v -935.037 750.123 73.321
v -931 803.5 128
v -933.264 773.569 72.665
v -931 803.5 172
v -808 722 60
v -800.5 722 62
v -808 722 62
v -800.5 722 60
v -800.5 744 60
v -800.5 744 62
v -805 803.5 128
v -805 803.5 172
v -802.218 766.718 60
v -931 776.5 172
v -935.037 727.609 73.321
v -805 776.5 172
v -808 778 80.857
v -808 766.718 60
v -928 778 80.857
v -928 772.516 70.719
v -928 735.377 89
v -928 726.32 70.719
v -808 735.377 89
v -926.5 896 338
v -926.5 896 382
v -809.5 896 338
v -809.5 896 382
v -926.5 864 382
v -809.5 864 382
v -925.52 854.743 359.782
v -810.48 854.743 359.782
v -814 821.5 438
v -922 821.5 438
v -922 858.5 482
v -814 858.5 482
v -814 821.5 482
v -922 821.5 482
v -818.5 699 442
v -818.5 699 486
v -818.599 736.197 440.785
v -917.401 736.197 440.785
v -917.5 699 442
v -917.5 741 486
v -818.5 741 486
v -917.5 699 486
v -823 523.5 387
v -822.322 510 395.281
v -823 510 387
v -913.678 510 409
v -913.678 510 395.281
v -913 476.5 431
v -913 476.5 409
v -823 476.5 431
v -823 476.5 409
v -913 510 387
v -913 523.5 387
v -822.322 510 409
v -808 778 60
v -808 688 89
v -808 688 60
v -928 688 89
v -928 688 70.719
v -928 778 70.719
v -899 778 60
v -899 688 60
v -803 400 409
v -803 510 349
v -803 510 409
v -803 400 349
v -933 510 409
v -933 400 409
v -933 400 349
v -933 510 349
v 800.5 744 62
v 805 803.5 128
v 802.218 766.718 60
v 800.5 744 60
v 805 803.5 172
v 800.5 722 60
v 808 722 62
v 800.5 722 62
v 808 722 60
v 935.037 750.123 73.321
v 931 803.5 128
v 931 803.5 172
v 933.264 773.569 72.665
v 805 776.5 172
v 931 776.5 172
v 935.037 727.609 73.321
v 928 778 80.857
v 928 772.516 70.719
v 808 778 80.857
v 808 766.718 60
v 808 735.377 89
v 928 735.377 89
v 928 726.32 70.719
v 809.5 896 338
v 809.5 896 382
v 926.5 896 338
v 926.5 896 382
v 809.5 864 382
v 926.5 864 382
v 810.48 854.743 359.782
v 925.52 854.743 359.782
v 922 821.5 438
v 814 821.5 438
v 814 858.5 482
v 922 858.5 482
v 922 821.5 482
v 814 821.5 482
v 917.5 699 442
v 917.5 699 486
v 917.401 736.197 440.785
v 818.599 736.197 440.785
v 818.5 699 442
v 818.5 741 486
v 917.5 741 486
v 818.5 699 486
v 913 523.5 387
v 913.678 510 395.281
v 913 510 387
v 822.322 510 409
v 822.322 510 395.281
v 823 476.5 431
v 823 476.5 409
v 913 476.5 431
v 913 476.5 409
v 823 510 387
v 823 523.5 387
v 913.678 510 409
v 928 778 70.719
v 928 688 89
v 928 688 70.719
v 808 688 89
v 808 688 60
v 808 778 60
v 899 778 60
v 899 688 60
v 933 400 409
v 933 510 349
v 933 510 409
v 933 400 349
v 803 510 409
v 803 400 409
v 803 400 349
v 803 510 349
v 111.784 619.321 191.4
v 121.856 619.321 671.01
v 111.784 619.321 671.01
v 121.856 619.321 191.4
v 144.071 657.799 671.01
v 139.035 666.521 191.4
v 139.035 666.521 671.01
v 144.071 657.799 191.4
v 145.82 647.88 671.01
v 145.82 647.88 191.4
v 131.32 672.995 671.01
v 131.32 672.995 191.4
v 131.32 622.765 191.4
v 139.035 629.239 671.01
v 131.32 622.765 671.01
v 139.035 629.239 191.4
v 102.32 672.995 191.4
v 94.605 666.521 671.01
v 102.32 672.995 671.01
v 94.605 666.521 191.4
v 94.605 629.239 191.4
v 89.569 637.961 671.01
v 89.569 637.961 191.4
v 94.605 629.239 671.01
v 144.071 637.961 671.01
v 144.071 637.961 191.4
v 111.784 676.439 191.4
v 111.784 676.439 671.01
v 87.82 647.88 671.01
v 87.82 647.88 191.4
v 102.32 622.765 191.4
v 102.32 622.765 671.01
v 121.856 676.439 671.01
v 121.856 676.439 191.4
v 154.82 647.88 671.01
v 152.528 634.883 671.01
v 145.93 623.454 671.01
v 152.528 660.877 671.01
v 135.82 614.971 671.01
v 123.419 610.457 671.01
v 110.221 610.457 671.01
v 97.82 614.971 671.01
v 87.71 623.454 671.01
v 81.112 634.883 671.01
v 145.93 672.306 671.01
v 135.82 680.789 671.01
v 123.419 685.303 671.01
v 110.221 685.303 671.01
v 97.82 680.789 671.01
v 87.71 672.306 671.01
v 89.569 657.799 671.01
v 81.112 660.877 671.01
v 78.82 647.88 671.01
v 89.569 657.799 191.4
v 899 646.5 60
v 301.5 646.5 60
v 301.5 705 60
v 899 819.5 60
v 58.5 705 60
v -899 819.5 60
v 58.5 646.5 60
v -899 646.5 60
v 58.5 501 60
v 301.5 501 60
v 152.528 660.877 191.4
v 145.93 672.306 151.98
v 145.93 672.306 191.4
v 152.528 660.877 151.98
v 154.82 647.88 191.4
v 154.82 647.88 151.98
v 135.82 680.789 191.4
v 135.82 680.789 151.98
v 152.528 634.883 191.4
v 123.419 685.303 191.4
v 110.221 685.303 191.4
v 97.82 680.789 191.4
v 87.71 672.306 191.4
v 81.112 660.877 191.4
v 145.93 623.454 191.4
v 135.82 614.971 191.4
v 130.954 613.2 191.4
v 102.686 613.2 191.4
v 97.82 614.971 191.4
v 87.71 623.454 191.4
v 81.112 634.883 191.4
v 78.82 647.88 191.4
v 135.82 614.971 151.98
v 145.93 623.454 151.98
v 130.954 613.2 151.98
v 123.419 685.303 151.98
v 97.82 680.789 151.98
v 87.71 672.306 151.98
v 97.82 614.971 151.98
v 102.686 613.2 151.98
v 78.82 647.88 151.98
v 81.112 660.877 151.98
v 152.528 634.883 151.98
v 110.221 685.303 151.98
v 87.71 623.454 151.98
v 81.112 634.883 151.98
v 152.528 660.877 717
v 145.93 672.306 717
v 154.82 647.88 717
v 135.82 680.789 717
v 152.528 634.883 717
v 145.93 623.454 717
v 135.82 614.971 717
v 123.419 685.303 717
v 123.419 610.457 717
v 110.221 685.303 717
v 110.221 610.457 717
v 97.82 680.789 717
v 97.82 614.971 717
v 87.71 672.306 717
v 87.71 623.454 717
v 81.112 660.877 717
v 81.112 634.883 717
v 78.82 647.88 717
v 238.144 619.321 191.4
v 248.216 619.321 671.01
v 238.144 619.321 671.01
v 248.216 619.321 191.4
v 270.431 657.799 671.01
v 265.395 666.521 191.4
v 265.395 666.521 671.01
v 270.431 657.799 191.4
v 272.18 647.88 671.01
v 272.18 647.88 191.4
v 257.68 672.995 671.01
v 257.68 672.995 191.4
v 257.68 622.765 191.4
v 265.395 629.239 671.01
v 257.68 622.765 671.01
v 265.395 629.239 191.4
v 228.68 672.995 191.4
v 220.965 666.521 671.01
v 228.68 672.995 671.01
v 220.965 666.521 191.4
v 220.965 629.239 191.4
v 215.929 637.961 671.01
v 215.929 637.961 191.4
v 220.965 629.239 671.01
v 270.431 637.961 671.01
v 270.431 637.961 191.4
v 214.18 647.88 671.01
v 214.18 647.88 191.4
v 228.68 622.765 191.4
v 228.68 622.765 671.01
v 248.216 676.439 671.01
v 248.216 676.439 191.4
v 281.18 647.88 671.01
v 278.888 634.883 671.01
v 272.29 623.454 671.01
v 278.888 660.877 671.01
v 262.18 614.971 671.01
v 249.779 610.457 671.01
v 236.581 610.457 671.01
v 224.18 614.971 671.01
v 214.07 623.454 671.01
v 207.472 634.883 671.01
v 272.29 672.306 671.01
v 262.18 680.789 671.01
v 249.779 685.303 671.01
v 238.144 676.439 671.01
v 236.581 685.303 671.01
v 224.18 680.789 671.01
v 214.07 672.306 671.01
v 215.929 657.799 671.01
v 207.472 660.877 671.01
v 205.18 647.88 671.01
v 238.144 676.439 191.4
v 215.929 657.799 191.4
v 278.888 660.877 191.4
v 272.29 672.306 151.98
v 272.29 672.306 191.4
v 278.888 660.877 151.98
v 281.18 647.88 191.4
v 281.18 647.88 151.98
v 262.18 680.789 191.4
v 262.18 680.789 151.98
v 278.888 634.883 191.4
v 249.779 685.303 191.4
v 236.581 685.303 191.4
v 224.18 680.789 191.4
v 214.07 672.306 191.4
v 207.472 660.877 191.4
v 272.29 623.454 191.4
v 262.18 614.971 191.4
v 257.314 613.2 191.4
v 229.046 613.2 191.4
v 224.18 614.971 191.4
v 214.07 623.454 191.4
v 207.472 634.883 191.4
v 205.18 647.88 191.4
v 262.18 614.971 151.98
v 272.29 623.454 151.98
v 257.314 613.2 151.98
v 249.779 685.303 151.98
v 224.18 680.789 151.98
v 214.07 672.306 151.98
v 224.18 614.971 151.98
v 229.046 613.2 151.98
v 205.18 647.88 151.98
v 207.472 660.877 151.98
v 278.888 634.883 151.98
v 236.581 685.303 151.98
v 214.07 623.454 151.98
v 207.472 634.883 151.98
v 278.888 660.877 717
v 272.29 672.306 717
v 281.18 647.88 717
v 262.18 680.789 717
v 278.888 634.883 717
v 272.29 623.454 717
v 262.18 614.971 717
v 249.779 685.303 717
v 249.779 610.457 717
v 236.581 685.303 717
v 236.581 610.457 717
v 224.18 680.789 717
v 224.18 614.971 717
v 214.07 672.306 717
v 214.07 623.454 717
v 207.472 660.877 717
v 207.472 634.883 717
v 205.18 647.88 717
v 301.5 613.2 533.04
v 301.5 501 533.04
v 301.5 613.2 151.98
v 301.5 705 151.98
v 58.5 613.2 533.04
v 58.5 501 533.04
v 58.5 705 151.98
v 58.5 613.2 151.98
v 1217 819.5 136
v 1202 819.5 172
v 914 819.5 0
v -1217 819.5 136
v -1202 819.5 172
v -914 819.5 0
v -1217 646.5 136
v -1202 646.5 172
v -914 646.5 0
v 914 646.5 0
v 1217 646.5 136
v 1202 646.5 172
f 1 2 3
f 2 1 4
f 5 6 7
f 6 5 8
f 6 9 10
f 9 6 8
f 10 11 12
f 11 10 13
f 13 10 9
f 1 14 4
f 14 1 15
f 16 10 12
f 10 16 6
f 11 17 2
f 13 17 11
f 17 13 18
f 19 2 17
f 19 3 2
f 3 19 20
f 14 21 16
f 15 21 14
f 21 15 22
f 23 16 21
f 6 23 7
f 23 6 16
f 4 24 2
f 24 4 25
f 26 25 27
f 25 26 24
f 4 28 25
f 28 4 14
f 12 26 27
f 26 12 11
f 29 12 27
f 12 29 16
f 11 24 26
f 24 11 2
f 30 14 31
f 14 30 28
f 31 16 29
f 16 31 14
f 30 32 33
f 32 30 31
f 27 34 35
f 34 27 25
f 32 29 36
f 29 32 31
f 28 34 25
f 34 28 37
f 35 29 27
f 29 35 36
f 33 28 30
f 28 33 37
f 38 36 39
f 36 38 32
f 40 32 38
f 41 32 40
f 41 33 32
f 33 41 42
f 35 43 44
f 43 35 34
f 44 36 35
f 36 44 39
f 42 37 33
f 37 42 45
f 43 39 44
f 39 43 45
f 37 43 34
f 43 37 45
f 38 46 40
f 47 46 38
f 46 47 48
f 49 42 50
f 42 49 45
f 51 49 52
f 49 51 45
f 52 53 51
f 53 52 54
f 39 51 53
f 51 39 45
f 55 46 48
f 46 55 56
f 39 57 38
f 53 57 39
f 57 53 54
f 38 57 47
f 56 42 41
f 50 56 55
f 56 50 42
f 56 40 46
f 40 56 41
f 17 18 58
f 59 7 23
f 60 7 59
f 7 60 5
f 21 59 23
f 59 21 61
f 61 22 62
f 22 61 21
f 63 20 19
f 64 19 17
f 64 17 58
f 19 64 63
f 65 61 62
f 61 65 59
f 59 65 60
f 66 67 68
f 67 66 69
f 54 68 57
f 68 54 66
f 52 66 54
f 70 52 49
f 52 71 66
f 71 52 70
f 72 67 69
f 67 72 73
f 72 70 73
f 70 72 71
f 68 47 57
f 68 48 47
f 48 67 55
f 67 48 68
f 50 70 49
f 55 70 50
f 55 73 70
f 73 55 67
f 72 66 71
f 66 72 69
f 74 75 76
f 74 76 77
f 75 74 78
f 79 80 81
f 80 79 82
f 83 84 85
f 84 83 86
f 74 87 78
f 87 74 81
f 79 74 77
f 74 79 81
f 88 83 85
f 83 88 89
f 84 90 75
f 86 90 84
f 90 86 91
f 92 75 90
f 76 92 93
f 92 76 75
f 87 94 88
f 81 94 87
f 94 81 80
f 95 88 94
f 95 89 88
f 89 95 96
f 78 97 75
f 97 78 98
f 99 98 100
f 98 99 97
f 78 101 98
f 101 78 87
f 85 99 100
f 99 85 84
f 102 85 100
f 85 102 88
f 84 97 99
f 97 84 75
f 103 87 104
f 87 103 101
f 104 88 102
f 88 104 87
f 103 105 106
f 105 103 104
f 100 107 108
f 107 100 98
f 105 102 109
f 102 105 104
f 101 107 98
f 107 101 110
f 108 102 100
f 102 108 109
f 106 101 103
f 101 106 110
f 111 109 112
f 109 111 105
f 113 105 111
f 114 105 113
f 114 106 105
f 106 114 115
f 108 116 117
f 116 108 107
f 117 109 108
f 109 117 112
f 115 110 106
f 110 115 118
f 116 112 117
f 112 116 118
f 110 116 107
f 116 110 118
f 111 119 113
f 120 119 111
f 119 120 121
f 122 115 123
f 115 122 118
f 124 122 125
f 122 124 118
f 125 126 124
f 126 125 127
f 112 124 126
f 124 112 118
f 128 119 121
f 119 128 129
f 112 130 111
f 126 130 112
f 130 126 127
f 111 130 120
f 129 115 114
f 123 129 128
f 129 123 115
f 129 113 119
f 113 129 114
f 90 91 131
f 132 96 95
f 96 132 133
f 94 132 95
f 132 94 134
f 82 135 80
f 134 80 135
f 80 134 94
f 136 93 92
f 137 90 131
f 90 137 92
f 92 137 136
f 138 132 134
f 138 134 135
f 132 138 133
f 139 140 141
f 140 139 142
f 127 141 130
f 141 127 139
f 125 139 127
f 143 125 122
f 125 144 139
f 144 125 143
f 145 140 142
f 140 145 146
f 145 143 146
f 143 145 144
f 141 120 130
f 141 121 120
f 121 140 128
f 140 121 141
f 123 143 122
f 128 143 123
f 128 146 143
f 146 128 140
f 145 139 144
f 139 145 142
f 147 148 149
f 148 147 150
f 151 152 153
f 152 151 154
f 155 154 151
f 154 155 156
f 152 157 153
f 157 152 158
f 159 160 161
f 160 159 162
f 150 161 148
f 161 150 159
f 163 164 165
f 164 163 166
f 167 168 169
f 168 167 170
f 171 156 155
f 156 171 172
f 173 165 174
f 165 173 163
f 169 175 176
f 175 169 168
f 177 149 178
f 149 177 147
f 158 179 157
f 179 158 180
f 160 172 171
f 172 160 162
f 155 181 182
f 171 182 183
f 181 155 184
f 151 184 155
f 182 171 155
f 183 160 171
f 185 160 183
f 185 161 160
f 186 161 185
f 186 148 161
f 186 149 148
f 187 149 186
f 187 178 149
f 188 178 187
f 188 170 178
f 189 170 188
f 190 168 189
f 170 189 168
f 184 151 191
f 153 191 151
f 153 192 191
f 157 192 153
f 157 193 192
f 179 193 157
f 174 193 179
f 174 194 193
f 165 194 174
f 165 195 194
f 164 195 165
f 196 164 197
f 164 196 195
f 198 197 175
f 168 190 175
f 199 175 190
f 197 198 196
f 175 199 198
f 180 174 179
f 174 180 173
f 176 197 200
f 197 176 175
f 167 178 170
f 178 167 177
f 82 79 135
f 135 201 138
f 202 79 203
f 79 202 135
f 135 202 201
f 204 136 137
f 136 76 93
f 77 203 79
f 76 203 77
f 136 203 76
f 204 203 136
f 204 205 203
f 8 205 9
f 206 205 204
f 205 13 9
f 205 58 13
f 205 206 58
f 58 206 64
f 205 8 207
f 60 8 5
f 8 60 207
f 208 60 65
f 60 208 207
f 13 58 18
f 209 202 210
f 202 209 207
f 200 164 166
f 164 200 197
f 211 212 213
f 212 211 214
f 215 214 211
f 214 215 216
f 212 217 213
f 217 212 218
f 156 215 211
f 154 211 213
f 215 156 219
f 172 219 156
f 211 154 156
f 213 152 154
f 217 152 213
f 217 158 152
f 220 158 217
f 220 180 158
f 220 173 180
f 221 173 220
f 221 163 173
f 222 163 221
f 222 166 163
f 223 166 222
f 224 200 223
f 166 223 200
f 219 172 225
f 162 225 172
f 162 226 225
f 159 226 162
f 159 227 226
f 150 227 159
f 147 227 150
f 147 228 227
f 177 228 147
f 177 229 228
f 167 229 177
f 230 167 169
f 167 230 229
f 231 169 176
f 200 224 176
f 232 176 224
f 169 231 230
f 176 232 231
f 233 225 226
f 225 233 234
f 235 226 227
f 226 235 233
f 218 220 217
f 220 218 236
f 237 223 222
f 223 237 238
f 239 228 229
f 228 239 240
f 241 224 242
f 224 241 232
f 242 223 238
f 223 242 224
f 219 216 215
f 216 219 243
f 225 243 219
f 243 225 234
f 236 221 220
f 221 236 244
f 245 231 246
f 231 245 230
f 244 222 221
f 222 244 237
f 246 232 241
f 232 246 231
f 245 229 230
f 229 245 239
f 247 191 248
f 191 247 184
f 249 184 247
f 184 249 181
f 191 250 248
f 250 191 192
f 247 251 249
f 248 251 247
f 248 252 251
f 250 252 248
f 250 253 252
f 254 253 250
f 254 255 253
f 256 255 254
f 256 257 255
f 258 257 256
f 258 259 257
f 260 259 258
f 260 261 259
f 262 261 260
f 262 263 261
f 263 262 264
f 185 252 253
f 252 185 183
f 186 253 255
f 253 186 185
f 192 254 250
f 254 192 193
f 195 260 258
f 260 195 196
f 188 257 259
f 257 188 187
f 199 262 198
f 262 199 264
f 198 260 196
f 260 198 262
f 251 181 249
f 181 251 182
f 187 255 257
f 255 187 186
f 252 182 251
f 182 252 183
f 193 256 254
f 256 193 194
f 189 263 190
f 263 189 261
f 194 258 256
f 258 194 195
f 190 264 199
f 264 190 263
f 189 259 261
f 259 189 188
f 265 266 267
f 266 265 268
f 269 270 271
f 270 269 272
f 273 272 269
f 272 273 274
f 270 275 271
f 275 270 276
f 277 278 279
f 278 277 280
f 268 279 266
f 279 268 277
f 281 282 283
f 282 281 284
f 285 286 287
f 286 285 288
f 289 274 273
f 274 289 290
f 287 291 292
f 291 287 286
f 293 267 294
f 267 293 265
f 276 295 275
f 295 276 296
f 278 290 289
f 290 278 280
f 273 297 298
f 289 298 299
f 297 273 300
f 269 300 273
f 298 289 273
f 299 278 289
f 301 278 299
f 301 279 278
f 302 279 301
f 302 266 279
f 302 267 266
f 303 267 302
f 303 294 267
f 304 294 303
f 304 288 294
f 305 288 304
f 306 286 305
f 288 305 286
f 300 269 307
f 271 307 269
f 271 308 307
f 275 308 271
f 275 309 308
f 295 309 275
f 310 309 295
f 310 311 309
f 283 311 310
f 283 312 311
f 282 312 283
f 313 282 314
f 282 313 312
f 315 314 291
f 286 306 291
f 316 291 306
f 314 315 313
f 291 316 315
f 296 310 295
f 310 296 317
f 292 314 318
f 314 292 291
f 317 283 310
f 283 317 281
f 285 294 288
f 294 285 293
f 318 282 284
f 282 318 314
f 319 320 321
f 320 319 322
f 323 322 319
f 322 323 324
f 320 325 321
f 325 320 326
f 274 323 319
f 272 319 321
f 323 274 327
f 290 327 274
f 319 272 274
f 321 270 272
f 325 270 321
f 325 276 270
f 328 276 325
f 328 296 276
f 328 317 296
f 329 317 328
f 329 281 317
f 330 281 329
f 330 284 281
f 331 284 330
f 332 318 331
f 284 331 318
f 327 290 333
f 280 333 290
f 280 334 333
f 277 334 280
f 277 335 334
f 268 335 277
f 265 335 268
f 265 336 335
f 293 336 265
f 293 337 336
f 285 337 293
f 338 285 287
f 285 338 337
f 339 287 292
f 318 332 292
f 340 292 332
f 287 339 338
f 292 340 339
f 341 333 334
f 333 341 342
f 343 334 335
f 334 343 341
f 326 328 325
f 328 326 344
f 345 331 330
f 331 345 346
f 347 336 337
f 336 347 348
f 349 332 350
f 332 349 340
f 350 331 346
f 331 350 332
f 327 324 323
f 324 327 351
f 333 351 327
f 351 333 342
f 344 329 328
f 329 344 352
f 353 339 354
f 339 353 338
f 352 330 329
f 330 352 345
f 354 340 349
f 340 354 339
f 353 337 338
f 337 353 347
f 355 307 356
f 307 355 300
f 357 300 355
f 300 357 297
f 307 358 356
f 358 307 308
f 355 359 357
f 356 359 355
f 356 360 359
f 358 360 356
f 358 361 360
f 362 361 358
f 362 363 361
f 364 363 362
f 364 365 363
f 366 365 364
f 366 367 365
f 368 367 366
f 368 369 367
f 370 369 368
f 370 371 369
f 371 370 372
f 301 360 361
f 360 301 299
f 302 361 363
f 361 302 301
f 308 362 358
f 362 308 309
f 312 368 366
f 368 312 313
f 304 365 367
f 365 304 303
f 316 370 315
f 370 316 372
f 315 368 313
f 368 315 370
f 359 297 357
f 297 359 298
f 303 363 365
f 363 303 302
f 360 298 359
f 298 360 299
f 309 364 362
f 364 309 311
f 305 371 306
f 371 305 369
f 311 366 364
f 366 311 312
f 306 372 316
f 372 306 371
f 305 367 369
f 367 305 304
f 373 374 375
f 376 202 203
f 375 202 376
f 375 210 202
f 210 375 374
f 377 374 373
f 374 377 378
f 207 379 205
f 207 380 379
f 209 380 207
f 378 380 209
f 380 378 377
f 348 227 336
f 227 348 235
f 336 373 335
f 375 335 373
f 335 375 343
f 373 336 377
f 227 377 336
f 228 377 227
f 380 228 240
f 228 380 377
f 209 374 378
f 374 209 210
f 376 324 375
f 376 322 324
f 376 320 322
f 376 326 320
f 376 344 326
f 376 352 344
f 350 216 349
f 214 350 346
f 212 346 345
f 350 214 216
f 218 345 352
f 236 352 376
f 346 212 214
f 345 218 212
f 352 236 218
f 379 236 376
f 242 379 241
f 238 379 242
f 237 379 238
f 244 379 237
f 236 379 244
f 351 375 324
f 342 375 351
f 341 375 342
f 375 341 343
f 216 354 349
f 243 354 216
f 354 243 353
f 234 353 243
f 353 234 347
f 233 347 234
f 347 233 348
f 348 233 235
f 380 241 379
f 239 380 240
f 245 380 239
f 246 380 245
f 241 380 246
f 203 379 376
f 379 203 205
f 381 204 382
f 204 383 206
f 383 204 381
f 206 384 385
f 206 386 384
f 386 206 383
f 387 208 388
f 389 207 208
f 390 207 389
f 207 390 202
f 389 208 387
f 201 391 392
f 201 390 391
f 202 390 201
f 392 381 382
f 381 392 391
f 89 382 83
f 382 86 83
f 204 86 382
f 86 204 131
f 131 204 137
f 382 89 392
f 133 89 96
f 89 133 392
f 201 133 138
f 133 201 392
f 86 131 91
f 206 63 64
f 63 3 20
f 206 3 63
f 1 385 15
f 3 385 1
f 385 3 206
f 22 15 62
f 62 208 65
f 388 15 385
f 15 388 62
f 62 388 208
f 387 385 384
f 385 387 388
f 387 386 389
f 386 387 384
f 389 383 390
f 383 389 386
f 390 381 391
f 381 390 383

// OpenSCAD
// Dragonfly's landing gear: a flat plate skid, two bent strip legs and a DrACO drill pack, for
// model/dragonfly.scad to pull in with use <skid.scad>. Rendered on its own, this file shows the left side.
// Units are mm, Z up, with the skid's bottom on z = 0, +X towards the nose and the lander's centreline on
// y = 0. Sizes come from spacecraft_details/dimensions.md, "Skids, legs and drills": the forms from the
// May 12, 2026 tap test photo, and the sizes from NASA's print model.

/* [Print] */
// Print at 1:model_scale. 1 is full size.
model_scale = 1; // [1:1000]
// Draws the DrACO drill pack
show_drill = true;

/* [From dimensions.md] */
// Centre to centre of the skids
track = 1466;
skid_width = 173;
// Skid's half-length, and the legs' x (estimated)
skid_half = 1217;
leg_x = 868;
// How far before the tip its bottom starts to rise, and the height of its tip's top
tip_rise = 303;
tip_top = 172;
// Skid plate's thickness
skid_t = 60;
// The leg's width along x
leg_width = 90;
// The drill pack's size: along x, across y, and its height
drill_pack = [243, 204, 657];
// Drill pack's position along the skid (estimated)
drill_x = 180;
// Height of the belly's underside where the leg meets it, from the hull
belly_z = 354;

/* [Hidden] */
skid_gold = [0.82, 0.73, 0.45];
leg_grey = [0.58, 0.58, 0.6];
gold = [0.8, 0.65, 0.3];
fork = [0.32, 0.32, 0.34];
pack = [0.48, 0.48, 0.5];
tube = [0.68, 0.69, 0.71];
// The leg's centreline in the yz plane, from the skid up and round to under the belly
leg_path = [[733, 40], [790, 150], [880, 360], [840, 460], [720, belly_z + 110], [500, belly_z + 55]];

// A skid centred on y = 0, along x
module skid() {
    color(skid_gold) rotate([90, 0, 0]) linear_extrude(skid_width, center = true)
        polygon([[-skid_half + tip_rise, 0], [skid_half - tip_rise, 0], [skid_half, tip_top - skid_t * 0.6],
                 [skid_half - 15, tip_top], [skid_half - tip_rise - 15, skid_t], [-skid_half + tip_rise + 15, skid_t],
                 [-skid_half + 15, tip_top], [-skid_half, tip_top - skid_t * 0.6]]);
}

// A bent strip leg in the yz plane at x = 0, widening towards the skid
module leg() {
    n = len(leg_path);
    color(leg_grey) for (i = [0:n - 2]) hull() {
        for (j = [i, i + 1]) let(w = leg_width * (1 + 0.5 * (n - 1 - j) / (n - 1)))
            translate([0, leg_path[j][0], leg_path[j][1]]) cube([w, 22 + 25 * (j / (n - 1)), 44], center = true);
    }
    // A foot on the skid and a fork under the belly
    color(gold) translate([0, 733, skid_t + 14]) cube([120, 90, 30], center = true);
    color(fork) translate([0, 455, belly_z + 25]) cube([130, 110, 60], center = true);
}

// The drill pack, standing on z = 0, centred on the origin: a block with two drill tubes on its outer side
module drill(size = drill_pack) {
    color(pack) translate([-size[0] / 2, -size[1] / 2, 0]) cube([size[0], size[1] * 0.55, size[2] * 0.72]);
    color(pack) translate([-size[0] / 2, -size[1] / 2, 0]) cube([size[0] * 1.0, size[1], size[2] * 0.14]);
    for (x = [-size[0] * 0.26, size[0] * 0.26]) translate([x, size[1] * 0.22, 0]) {
        color(tube) cylinder(d = 58, h = size[2] * 0.93, $fn = 18);
        color(fork) cylinder(d = 76, h = size[2] * 0.2, $fn = 18);
        color(gold) translate([0, 0, size[2] * 0.93]) cylinder(d = 76, h = size[2] * 0.07, $fn = 18);
    }
}

// All the gear on the lander's left (+Y). The right is its mirror image.
module gear_left(with_drill = show_drill) {
    translate([0, track / 2, 0]) skid();
    for (x = [-leg_x, leg_x]) translate([x, 0, 0]) leg();
    if (with_drill) translate([drill_x, track / 2 - 130, skid_t]) drill();
}

scale(1 / model_scale) gear_left();
